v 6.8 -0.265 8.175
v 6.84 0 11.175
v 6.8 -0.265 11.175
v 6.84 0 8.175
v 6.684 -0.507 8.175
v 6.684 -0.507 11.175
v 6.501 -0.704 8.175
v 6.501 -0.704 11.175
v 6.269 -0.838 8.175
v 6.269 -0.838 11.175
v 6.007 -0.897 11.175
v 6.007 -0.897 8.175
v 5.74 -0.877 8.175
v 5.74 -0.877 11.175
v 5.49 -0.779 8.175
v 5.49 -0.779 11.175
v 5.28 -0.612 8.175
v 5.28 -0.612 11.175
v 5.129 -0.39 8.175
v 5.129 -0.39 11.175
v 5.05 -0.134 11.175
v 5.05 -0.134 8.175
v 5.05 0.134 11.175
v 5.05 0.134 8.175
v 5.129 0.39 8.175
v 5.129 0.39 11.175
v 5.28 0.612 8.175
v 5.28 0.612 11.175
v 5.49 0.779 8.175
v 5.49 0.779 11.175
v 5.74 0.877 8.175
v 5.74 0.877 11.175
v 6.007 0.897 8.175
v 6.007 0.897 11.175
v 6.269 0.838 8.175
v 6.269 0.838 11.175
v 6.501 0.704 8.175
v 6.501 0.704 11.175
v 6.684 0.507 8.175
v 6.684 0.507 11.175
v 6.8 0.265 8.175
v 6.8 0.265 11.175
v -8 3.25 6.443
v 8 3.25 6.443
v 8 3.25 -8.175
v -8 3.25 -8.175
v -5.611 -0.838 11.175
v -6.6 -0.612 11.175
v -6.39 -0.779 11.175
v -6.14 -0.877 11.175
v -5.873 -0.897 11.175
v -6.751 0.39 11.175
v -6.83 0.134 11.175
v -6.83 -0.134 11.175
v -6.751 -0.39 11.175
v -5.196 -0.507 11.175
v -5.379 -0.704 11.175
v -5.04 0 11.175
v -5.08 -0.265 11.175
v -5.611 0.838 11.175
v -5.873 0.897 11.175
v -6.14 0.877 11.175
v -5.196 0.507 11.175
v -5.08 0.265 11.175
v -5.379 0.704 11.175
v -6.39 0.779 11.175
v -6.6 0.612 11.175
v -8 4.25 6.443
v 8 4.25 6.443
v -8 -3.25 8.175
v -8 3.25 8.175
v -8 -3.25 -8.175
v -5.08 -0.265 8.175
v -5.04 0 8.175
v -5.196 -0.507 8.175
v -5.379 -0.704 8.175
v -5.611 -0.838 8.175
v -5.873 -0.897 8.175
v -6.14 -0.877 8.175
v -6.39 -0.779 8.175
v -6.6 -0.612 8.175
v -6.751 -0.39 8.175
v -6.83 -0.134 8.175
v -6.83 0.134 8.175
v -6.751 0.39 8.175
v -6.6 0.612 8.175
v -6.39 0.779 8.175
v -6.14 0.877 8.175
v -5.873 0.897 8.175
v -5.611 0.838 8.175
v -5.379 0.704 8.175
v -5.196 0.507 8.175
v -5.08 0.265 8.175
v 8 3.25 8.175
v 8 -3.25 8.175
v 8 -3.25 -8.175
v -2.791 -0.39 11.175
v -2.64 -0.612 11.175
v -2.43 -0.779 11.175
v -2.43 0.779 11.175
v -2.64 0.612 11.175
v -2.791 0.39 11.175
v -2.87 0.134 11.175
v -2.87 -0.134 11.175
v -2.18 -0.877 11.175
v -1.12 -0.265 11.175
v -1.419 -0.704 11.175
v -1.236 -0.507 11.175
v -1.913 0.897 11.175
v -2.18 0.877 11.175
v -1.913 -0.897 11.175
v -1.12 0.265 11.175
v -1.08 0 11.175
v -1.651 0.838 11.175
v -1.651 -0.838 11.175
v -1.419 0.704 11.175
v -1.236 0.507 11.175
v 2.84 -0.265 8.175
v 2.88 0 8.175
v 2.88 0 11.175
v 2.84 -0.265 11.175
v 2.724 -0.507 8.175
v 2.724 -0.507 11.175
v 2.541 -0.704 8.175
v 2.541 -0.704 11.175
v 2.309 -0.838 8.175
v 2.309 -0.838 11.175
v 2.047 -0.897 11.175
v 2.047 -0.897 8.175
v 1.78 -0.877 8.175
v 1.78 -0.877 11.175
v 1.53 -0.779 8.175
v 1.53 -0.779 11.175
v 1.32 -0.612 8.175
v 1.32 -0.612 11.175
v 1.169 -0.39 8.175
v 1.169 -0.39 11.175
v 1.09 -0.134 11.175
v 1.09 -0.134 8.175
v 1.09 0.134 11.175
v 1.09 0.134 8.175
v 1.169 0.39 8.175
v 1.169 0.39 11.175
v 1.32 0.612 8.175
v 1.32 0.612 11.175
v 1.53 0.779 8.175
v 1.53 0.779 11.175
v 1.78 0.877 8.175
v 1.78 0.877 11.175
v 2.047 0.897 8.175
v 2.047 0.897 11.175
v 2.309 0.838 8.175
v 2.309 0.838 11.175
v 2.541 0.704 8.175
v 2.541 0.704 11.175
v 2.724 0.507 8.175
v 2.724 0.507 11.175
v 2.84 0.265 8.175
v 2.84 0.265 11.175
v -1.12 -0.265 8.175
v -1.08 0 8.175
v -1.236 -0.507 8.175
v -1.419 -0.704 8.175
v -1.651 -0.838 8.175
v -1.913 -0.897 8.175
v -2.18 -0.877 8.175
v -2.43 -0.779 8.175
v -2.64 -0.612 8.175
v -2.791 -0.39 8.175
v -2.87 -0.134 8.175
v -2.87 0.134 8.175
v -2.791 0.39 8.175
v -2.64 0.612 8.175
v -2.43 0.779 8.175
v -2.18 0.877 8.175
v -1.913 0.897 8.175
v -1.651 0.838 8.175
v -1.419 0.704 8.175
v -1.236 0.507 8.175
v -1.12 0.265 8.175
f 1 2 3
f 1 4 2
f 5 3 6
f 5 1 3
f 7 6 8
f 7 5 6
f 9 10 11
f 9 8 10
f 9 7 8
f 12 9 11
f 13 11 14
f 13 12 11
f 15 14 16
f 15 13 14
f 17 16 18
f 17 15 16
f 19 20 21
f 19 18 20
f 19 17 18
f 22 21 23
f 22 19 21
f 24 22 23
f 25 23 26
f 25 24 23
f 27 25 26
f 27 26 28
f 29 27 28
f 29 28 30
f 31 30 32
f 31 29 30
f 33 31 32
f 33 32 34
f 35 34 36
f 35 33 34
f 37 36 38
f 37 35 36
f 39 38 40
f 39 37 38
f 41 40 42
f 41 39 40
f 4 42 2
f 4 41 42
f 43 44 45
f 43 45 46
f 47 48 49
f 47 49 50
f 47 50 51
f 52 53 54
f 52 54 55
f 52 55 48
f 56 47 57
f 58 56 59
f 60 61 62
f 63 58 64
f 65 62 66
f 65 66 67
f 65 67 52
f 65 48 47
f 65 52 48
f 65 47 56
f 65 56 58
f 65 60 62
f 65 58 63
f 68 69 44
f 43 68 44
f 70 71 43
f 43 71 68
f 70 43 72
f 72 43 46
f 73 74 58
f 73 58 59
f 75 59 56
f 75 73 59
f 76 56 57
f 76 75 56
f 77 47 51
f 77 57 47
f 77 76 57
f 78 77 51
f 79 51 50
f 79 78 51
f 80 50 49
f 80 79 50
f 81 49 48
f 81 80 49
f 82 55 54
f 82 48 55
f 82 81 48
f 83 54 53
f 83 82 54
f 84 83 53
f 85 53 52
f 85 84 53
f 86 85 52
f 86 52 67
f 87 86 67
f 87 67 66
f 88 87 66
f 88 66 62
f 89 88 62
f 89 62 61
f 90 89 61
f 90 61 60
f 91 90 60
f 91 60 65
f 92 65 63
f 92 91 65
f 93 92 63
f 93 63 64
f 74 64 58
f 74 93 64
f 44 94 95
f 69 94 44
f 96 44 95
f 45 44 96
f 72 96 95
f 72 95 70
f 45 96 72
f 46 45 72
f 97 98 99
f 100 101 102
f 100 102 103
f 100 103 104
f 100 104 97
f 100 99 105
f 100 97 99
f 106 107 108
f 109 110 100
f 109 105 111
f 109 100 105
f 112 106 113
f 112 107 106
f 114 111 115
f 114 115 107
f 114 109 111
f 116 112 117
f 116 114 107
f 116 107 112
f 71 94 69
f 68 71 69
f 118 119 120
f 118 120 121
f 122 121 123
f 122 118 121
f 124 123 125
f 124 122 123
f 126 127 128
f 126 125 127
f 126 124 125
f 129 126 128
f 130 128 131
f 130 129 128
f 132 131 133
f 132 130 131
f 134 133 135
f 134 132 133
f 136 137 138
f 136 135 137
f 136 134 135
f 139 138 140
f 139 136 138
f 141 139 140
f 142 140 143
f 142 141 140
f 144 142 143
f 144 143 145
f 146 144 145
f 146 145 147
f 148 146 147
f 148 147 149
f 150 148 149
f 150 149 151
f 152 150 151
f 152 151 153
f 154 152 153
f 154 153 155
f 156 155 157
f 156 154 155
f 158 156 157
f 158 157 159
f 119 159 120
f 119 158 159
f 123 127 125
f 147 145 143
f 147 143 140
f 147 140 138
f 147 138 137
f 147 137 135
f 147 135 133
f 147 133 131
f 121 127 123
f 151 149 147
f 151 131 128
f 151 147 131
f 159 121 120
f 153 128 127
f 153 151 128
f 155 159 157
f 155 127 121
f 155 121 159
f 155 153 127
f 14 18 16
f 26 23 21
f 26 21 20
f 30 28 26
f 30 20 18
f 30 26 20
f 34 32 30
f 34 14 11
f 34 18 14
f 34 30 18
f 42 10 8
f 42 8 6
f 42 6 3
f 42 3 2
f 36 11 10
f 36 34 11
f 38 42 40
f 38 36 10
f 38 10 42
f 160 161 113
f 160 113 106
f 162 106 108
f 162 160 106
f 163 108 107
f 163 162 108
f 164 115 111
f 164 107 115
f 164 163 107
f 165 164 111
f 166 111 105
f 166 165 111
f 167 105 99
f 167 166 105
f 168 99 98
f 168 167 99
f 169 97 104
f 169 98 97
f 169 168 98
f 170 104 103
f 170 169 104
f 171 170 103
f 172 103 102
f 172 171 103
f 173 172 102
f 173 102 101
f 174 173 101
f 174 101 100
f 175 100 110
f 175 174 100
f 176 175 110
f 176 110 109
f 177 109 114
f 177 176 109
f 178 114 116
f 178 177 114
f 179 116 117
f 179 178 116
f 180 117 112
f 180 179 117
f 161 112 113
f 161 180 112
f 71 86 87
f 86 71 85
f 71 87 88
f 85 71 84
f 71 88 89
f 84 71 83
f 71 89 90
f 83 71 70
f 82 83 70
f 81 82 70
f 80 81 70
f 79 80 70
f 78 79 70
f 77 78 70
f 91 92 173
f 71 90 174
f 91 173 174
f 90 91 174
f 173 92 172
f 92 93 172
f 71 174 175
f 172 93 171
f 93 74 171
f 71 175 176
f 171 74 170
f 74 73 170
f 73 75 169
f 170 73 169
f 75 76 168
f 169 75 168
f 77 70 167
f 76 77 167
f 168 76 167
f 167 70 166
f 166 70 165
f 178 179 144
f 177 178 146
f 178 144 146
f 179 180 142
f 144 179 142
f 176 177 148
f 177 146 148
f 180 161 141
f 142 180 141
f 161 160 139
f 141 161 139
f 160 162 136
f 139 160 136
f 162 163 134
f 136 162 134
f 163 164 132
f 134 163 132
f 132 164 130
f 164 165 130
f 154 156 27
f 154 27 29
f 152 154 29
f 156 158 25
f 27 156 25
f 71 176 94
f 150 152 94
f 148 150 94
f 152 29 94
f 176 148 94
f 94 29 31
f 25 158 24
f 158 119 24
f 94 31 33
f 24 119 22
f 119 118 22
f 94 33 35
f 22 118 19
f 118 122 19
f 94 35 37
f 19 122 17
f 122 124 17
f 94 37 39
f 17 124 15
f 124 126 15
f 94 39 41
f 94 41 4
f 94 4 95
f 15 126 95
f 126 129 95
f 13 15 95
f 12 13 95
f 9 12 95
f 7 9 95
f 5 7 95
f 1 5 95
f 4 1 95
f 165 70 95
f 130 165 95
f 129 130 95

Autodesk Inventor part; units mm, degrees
ref_plane "YZ Plane" through (0, 0, 0) normal (1, 0, 0) x (0, 1, 0)
ref_plane "XZ Plane" through (0, 0, 0) normal (0, 1, 0) x (-1, 0, 0)
ref_plane "XY Plane" through (0, 0, 0) normal (0, 0, 1) x (1, 0, 0)
sketch "Boceto1" plane through (0, 0, 0) normal (0, 1, 0) x (-1, 0, 0)
  line L0 (8, 8.175) -> (-8, 8.175)
  line L1 (-8, 8.175) -> (-8, -8.175)
  line L2 (-8, -8.175) -> (8, -8.175)
  line L3 (8, -8.175) -> (8, 8.175)
  point P0 (0, 0)
  dimension "d0" = 16.35
  dimension "d1" = 16
  dimension "d2" = 8
  dimension "d3" = 8.175
extrude "Extrusión1" add sketch "Boceto1" along normal mid plane 6.5
sketch "Boceto2" plane through (8, -3.25, -8.175) normal (1, 0, 0) x (0, 0, -1)
  line L0 (0, 0) -> (0, 6.5) projected
  line L1 (-16.35, 6.5) -> (0, 6.5) projected
  line L2 (-16.35, 0) -> (-16.35, 6.5) projected
  line L3 (0, 0) -> (-16.35, 0) projected
  line L4 (0, 6.5) -> (-16.35, 6.5) projected
  line L5 (-16.35, 6.5) -> (-14.6179, 7.5)
  line L6 (-14.6179, 7.5) -> (-14.6179, 6.5)
  line L7 (-16.35, 6.5) -> (-14.6179, 6.5)
  point P0 (-8.175, 3.25)
  dimension "d6" = 7.5
  dimension "d7" = 60
extrude "Extrusión2" add sketch "Boceto2" against normal blind 16 contours L1 L5 L6
sketch "Boceto3" plane through (-8, -3.25, 8.175) normal (0, 0, 1) x (1, 0, 0)
  line L0 (16, 0) -> (16, 6.5) projected
  line L1 (0, 6.5) -> (16, 6.5) projected
  line L2 (0, 0) -> (0, 6.5) projected
  line L3 (16, 0) -> (0, 0) projected
  circle A0 centre (13.94, 3.25) radius 0.9
  circle A1 centre (9.98, 3.25) radius 0.9
  circle A2 centre (6.02, 3.25) radius 0.9
  circle A3 centre (2.06, 3.25) radius 0.9
  point P0 (8, 3.25)
  dimension "d10" = 3.25
  dimension "P" = 3.96
  dimension "d12" = 3.96
  dimension "d13" = 3.96
  dimension "d14" = 2.06
  dimension "d15" = 1.8
  dimension "d16" = 1.8
  dimension "d17" = 1.8
  dimension "d18" = 1.8
extrude "Extrusión3" add sketch "Boceto3" along normal blind 3 contours A0 | A1 | A2 | A3
equation "\"d12\" = P"
equation "\"d13\" = P"
properties part number "conector_4pines"
